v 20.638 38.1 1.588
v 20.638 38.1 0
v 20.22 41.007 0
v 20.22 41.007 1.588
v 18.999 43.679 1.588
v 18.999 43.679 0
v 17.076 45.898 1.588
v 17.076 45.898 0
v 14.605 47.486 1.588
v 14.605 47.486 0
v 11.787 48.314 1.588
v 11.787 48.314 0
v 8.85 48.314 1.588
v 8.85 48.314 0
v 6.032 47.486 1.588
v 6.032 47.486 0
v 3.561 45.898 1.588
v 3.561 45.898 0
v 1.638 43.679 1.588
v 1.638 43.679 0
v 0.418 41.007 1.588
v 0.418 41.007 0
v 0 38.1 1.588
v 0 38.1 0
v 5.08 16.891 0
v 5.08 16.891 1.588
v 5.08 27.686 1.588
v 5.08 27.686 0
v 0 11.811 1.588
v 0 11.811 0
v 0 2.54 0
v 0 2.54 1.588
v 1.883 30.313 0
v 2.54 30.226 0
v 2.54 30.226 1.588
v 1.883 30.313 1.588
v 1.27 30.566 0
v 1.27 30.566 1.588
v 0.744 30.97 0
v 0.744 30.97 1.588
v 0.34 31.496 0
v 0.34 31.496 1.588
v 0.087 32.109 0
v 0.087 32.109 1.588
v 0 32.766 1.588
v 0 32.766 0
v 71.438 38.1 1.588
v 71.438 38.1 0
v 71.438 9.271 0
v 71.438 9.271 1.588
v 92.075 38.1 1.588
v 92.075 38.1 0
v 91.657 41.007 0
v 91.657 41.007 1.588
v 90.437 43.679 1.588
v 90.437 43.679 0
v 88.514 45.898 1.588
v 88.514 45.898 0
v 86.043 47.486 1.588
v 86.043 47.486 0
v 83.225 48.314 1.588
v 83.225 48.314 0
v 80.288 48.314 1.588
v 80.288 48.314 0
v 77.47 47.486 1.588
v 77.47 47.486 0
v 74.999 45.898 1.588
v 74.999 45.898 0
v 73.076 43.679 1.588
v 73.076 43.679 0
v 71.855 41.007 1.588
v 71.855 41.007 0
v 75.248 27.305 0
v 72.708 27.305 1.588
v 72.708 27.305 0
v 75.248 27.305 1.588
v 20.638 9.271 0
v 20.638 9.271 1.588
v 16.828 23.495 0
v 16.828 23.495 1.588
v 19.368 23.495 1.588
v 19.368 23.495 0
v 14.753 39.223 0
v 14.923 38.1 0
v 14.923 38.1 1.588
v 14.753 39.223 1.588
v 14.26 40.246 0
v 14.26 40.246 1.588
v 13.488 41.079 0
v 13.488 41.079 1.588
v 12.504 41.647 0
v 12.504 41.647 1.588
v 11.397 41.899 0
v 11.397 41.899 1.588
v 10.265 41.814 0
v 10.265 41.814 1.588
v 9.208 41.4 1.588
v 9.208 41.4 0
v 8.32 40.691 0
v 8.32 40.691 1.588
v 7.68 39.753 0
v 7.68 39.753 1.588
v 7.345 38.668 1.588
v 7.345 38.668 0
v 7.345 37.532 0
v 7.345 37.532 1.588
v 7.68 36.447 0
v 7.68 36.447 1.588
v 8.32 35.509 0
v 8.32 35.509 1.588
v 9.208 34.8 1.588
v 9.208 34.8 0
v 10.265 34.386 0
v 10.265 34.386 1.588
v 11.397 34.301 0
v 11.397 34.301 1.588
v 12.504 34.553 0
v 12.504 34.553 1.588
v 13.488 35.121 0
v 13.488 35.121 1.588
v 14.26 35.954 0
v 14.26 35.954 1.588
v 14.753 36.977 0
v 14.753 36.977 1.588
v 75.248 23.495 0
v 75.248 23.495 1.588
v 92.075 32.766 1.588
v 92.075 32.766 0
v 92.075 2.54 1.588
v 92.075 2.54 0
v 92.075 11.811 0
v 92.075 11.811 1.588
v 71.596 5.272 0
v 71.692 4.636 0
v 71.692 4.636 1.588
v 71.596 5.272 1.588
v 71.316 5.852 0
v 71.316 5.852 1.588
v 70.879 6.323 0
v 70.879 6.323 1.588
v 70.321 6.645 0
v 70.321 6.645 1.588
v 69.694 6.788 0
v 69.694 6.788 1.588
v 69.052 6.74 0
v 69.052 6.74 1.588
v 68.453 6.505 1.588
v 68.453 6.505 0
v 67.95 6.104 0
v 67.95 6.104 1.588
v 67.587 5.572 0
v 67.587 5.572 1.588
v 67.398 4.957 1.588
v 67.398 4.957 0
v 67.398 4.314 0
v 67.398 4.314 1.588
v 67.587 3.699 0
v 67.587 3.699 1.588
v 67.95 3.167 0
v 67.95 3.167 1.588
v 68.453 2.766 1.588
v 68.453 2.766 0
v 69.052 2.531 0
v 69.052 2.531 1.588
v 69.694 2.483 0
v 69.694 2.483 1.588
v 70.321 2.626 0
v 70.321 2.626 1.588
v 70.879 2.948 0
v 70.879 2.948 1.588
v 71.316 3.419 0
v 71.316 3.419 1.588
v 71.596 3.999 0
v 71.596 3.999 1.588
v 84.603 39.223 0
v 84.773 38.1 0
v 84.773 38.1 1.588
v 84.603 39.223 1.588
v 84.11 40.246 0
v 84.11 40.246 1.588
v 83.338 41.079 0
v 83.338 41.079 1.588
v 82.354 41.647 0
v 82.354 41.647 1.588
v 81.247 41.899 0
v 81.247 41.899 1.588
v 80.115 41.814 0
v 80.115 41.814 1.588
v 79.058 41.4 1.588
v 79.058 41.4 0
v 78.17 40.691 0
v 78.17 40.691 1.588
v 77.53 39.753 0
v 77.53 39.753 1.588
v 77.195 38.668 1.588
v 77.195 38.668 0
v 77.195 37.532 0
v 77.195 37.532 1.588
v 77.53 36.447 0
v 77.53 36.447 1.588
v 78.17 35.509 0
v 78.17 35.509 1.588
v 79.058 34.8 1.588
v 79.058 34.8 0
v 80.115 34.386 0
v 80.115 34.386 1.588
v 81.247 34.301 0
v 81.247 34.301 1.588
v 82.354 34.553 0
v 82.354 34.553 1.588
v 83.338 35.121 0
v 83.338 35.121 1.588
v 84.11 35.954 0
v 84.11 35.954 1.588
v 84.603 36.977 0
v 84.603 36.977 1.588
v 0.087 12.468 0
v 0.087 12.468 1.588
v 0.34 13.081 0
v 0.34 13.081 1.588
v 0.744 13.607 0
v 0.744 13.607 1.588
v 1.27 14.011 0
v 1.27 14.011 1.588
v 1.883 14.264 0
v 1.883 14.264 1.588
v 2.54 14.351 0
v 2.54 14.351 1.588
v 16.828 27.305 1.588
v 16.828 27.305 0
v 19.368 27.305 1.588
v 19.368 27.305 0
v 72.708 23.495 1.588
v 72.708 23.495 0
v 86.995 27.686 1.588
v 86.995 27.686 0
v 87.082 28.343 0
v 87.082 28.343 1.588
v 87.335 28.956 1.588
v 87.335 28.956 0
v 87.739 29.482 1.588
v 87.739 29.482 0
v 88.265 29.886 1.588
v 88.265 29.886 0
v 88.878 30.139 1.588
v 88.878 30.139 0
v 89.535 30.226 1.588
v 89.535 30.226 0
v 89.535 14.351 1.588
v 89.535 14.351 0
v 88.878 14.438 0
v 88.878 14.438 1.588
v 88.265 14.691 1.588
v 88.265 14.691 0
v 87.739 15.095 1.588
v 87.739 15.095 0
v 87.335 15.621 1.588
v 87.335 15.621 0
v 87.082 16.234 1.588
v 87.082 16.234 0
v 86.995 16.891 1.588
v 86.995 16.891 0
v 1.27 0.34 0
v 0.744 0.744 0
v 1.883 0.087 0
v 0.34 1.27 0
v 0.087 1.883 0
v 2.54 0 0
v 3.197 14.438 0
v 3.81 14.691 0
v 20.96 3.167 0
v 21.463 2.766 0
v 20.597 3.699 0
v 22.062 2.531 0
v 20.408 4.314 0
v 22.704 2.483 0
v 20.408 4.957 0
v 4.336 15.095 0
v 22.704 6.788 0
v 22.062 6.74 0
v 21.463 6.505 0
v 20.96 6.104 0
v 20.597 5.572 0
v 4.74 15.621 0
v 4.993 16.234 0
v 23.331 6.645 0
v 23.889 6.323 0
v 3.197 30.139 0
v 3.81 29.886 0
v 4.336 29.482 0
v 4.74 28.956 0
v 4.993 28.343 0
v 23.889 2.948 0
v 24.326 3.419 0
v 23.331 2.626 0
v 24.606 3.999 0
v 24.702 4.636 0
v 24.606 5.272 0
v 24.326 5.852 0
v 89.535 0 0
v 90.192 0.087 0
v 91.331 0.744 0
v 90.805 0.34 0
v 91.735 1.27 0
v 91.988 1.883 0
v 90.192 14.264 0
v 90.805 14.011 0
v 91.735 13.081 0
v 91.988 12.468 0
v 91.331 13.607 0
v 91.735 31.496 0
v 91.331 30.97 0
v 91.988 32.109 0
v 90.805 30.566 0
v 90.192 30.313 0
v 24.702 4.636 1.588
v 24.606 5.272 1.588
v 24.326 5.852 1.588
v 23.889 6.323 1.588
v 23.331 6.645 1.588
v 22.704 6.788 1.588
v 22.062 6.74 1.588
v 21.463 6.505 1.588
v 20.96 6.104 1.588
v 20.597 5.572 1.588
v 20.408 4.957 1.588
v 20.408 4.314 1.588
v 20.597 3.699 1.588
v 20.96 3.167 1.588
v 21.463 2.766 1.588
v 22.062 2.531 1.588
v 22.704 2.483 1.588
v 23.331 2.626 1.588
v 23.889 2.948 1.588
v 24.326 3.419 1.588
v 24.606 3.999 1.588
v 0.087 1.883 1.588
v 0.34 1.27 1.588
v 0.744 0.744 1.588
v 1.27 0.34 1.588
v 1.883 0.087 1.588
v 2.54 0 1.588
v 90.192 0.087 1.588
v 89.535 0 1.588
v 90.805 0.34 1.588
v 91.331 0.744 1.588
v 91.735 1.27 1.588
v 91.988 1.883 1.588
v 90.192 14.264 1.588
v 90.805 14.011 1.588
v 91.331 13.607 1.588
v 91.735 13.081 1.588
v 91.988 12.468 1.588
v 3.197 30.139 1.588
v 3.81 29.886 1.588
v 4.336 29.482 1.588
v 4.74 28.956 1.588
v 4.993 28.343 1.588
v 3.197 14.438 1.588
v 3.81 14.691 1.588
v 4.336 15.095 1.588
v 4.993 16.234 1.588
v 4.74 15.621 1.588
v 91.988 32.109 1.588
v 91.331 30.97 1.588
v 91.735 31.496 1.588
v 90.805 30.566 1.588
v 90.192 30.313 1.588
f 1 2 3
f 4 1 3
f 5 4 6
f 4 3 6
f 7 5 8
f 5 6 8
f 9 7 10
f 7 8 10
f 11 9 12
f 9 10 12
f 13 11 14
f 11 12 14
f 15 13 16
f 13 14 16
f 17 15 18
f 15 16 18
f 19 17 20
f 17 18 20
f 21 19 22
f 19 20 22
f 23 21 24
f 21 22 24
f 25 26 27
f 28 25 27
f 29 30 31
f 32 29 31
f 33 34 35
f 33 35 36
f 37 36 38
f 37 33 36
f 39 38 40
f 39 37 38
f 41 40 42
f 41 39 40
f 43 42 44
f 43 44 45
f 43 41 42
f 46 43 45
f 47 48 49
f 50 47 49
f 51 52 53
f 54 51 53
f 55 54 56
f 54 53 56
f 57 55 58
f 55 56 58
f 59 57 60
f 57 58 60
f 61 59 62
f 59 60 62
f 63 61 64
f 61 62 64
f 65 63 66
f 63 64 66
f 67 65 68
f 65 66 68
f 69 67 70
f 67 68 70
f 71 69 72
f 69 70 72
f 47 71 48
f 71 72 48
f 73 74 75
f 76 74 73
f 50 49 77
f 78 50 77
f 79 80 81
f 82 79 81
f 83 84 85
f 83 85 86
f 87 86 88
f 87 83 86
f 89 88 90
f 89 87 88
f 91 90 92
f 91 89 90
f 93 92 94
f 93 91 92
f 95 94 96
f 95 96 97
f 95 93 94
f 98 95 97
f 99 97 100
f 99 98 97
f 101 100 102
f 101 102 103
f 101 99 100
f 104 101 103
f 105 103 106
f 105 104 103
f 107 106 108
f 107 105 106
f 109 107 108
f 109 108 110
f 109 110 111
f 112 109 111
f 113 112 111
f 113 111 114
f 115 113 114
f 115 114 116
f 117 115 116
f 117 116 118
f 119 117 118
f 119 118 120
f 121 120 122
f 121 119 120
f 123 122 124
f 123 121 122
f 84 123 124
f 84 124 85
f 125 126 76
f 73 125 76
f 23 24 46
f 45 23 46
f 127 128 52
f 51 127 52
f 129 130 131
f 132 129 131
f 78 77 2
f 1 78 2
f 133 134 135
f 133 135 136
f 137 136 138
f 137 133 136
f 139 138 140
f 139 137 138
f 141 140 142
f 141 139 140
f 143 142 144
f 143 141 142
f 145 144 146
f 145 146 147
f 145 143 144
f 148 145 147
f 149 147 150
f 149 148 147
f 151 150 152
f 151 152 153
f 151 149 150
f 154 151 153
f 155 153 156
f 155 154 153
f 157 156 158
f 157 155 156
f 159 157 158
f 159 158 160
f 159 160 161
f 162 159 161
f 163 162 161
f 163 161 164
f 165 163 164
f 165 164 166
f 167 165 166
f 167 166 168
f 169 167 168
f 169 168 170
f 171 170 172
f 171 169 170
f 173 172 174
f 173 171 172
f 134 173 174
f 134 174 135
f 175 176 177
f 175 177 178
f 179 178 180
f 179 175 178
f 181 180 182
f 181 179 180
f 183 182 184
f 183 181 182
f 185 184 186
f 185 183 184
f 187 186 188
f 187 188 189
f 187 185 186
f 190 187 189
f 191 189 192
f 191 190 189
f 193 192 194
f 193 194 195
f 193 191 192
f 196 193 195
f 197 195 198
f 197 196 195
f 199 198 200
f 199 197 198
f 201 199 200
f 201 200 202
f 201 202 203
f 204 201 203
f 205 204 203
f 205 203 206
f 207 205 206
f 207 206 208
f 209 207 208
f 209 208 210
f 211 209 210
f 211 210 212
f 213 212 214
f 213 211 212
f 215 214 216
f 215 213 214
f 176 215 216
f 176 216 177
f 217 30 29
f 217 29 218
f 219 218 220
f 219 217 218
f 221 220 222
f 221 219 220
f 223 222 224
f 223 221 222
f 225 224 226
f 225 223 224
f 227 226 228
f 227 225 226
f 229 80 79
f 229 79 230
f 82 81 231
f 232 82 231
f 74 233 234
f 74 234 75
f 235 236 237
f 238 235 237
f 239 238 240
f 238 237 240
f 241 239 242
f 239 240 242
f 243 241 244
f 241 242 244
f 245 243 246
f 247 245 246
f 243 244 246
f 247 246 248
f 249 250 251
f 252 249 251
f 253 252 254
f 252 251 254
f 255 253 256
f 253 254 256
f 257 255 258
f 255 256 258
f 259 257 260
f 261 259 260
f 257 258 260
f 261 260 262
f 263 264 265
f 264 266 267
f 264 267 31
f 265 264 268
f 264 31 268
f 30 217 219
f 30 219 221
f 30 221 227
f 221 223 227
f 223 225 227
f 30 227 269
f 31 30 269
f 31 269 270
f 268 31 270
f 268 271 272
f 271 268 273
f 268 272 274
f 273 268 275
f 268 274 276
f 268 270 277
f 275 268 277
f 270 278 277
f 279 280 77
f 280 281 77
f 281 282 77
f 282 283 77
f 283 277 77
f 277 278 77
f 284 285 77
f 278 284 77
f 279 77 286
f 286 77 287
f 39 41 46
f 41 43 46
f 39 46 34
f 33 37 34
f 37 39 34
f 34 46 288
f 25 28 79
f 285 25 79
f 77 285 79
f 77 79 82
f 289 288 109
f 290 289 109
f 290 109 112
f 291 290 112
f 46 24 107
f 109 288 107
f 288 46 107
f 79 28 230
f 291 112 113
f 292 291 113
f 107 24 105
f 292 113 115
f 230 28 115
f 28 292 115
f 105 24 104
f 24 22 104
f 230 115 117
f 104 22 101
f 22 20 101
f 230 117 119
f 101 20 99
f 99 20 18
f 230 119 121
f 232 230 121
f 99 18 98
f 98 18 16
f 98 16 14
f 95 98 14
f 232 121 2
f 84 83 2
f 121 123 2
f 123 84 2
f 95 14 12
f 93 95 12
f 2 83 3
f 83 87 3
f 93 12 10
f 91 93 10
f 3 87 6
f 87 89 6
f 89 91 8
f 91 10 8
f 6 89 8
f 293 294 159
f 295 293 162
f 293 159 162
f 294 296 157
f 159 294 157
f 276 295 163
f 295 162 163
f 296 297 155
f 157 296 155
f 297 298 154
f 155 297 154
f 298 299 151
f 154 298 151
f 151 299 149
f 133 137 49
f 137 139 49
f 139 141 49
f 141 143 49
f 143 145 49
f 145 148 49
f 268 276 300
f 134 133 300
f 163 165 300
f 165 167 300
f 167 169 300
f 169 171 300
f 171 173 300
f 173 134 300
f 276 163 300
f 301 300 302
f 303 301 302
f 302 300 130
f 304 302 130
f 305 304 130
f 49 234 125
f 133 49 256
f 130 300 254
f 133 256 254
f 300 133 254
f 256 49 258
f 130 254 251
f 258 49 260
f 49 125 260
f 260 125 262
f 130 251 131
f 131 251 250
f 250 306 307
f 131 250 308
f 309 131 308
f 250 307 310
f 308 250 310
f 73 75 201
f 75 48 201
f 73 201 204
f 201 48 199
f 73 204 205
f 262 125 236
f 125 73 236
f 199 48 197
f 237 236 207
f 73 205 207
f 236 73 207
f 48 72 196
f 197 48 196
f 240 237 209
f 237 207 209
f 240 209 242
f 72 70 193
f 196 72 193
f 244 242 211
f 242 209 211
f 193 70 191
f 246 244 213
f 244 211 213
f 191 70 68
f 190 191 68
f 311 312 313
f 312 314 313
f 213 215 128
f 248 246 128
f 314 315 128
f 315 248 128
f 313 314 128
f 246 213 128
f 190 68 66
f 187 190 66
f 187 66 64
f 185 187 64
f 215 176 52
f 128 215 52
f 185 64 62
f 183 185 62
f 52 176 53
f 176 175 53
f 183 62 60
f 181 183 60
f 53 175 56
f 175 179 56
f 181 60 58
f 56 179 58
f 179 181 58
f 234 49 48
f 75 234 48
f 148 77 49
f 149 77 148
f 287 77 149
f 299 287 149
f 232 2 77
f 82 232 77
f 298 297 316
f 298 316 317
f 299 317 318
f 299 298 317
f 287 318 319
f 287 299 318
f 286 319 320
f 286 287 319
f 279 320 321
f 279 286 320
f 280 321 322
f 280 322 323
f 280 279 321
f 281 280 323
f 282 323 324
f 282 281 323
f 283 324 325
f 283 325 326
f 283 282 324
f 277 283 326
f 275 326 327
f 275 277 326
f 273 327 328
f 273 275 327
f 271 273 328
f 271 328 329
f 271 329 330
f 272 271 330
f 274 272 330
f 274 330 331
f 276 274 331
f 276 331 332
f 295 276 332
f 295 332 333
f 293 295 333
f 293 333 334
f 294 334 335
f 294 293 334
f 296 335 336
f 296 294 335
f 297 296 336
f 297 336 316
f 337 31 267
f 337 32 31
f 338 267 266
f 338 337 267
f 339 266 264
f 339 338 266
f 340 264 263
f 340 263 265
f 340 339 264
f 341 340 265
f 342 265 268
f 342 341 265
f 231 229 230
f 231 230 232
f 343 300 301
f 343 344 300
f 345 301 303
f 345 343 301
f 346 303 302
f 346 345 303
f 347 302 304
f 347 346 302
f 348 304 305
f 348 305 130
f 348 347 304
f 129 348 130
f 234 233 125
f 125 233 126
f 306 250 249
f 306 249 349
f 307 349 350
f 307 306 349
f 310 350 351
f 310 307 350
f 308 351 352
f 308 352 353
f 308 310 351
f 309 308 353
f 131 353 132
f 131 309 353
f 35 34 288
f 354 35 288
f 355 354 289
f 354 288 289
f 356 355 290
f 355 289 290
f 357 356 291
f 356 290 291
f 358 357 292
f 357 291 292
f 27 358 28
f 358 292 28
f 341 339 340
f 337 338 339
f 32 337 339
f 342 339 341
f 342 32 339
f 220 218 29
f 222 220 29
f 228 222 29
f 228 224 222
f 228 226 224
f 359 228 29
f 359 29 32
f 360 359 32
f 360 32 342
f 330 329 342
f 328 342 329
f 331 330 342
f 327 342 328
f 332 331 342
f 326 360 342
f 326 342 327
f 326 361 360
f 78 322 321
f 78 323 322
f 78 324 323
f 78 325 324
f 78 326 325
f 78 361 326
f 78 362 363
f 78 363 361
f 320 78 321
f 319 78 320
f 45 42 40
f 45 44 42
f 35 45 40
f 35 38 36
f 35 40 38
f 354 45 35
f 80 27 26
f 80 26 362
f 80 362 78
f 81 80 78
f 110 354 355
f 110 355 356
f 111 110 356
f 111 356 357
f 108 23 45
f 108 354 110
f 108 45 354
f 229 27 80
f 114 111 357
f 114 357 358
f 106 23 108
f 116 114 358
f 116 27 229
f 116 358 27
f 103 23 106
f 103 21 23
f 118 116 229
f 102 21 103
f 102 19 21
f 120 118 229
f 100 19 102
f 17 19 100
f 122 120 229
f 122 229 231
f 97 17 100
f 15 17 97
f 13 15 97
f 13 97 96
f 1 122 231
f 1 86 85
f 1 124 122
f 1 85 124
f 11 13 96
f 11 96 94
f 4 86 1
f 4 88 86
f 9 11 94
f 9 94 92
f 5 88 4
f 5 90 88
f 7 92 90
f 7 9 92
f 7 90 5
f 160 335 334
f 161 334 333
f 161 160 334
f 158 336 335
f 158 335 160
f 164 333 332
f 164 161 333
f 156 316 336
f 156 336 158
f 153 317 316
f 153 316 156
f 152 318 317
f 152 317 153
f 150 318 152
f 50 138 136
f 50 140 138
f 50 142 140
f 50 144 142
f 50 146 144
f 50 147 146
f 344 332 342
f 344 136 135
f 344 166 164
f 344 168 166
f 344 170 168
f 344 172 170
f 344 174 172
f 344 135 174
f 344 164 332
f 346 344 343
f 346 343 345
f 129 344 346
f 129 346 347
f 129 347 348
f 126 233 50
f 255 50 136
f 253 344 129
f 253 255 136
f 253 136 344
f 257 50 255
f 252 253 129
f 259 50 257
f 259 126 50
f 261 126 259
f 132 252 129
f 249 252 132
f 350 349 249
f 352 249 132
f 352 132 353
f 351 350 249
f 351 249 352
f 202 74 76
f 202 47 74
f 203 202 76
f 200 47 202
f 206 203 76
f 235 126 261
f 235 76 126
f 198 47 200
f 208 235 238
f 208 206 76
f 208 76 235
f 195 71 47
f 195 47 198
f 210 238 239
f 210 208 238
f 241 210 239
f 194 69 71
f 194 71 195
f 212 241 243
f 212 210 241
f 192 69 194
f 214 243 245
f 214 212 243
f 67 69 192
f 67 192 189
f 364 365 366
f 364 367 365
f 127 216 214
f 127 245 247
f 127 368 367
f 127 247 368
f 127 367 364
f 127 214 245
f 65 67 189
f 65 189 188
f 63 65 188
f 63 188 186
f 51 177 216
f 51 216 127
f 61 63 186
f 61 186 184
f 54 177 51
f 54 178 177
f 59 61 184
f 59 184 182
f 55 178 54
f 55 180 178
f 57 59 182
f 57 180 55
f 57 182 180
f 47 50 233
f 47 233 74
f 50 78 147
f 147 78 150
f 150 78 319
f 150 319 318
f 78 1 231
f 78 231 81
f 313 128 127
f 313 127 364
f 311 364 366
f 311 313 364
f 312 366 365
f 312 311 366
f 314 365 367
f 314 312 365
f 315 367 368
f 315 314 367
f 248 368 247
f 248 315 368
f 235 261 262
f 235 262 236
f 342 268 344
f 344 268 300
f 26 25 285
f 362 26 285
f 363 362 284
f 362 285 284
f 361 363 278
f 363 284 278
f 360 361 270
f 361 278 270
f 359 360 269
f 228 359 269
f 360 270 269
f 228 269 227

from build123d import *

# Parameters (mm, degrees)
SKETCH1_R           = 2.159
SKETCH1_R_2         = 3.81
BOSS_EXTRUDE1_DEPTH = 1.5875
FILLET1_R           = 2.54
SKETCH2_W           = 5.08
SKETCH2_H           = 15.875
SKETCH2_W_2         = 2.54
SKETCH2_H_2         = 3.81
CUT_EXTRUDE1_DEPTH  = 1.5875
FILLET2_START       = -1
FILLET2_DEPTH       = 4
FILLET2_2_DEPTH     = 1.5875


with BuildPart() as part:
    # Sketch1 → Boss-Extrude1 (new body)
    with BuildSketch(Plane.XY):
        with BuildLine():
            Line((0, 38.1), (0, 0))
            Line((0, 0), (92.075, 0))
            Line((92.075, 0), (92.075, 38.1))
            ThreePointArc((92.075, 38.1), (81.75625, 48.41875), (71.4375, 38.1))
            Line((71.4375, 38.1), (71.4375, 9.271))
            Line((71.4375, 9.271), (20.6375, 9.271))
            Line((20.6375, 9.271), (20.6375, 38.1))
            ThreePointArc((20.6375, 38.1), (10.31875, 48.41875), (0, 38.1))
        make_face()
        with Locations((22.5425, 4.6355)):
            Circle(SKETCH1_R, mode=Mode.SUBTRACT)
        with Locations((69.5325, 4.6355)):
            Circle(SKETCH1_R, mode=Mode.SUBTRACT)
        with Locations((11.1125, 38.1)):
            Circle(SKETCH1_R_2, mode=Mode.SUBTRACT)
        with Locations((80.9625, 38.1)):
            Circle(SKETCH1_R_2, mode=Mode.SUBTRACT)
    extrude(amount=BOSS_EXTRUDE1_DEPTH)

    # Fillet1
    fillet1_edges = [part.edges().sort_by_distance(p)[0] for p in [
        (92.075, 0, 0.79375),
        (0, 0, 0.79375),
    ]]
    fillet(fillet1_edges, radius=FILLET1_R)

    # Sketch2 → Cut-Extrude1 (cut)
    with BuildSketch(Plane.XY.offset(1.5875)):
        with Locations((89.535, 22.2885)):
            Rectangle(SKETCH2_W, SKETCH2_H)
        with Locations((2.54, 22.2885)):
            Rectangle(SKETCH2_W, SKETCH2_H)
        with Locations((18.0975, 25.4)):
            Rectangle(SKETCH2_W_2, SKETCH2_H_2)
        with Locations((73.9775, 25.4)):
            Rectangle(SKETCH2_W_2, SKETCH2_H_2)
    extrude(amount=-CUT_EXTRUDE1_DEPTH, mode=Mode.SUBTRACT)

    # Fillet2: read off the stored shape, not the designer's step
    # Fillet2 outline → Fillet2 (cut)
    with BuildSketch(Plane.XY.offset(FILLET2_START)):
        with BuildLine():
            Line((92.075, 14.351), (89.535, 14.351))
            ThreePointArc((89.535, 14.351), (91.331051224, 13.607051224), (92.075, 11.811))
            Line((92.075, 11.811), (92.075, 14.351))
        make_face()
        with BuildLine():
            ThreePointArc((92.075, 32.766), (91.331051224, 30.969948776), (89.535, 30.226))
            Line((89.535, 30.226), (92.075, 30.226))
            Line((92.075, 30.226), (92.075, 32.766))
        make_face()
        with BuildLine():
            Line((0, 30.226), (2.54, 30.226))
            ThreePointArc((2.54, 30.226), (0.743948776, 30.969948776), (0, 32.766))
            Line((0, 32.766), (0, 30.226))
        make_face()
        with BuildLine():
            ThreePointArc((0, 11.811), (0.743948776, 13.607051224), (2.54, 14.351))
            Line((2.54, 14.351), (0, 14.351))
            Line((0, 14.351), (0, 11.811))
        make_face()
    extrude(amount=FILLET2_DEPTH, mode=Mode.SUBTRACT)

    # Fillet2 2 outline → Fillet2 2 (add)
    with BuildSketch(Plane.XY):
        with BuildLine():
            ThreePointArc((89.535, 14.351), (87.738948776, 15.094948776), (86.995, 16.891))
            Line((86.995, 16.891), (86.995, 14.351))
            Line((86.995, 14.351), (89.535, 14.351))
        make_face()
        with BuildLine():
            ThreePointArc((86.995, 27.686), (87.738948776, 29.482051224), (89.535, 30.226))
            Line((89.535, 30.226), (86.995, 30.226))
            Line((86.995, 30.226), (86.995, 27.686))
        make_face()
        with BuildLine():
            ThreePointArc((2.54, 30.226), (4.336051224, 29.482051224), (5.08, 27.686))
            Line((5.08, 27.686), (5.08, 30.226))
            Line((5.08, 30.226), (2.54, 30.226))
        make_face()
        with BuildLine():
            ThreePointArc((5.08, 16.891), (4.336051224, 15.094948776), (2.54, 14.351))
            Line((2.54, 14.351), (5.08, 14.351))
            Line((5.08, 14.351), (5.08, 16.891))
        make_face()
    extrude(amount=FILLET2_2_DEPTH)


solid = part.part
